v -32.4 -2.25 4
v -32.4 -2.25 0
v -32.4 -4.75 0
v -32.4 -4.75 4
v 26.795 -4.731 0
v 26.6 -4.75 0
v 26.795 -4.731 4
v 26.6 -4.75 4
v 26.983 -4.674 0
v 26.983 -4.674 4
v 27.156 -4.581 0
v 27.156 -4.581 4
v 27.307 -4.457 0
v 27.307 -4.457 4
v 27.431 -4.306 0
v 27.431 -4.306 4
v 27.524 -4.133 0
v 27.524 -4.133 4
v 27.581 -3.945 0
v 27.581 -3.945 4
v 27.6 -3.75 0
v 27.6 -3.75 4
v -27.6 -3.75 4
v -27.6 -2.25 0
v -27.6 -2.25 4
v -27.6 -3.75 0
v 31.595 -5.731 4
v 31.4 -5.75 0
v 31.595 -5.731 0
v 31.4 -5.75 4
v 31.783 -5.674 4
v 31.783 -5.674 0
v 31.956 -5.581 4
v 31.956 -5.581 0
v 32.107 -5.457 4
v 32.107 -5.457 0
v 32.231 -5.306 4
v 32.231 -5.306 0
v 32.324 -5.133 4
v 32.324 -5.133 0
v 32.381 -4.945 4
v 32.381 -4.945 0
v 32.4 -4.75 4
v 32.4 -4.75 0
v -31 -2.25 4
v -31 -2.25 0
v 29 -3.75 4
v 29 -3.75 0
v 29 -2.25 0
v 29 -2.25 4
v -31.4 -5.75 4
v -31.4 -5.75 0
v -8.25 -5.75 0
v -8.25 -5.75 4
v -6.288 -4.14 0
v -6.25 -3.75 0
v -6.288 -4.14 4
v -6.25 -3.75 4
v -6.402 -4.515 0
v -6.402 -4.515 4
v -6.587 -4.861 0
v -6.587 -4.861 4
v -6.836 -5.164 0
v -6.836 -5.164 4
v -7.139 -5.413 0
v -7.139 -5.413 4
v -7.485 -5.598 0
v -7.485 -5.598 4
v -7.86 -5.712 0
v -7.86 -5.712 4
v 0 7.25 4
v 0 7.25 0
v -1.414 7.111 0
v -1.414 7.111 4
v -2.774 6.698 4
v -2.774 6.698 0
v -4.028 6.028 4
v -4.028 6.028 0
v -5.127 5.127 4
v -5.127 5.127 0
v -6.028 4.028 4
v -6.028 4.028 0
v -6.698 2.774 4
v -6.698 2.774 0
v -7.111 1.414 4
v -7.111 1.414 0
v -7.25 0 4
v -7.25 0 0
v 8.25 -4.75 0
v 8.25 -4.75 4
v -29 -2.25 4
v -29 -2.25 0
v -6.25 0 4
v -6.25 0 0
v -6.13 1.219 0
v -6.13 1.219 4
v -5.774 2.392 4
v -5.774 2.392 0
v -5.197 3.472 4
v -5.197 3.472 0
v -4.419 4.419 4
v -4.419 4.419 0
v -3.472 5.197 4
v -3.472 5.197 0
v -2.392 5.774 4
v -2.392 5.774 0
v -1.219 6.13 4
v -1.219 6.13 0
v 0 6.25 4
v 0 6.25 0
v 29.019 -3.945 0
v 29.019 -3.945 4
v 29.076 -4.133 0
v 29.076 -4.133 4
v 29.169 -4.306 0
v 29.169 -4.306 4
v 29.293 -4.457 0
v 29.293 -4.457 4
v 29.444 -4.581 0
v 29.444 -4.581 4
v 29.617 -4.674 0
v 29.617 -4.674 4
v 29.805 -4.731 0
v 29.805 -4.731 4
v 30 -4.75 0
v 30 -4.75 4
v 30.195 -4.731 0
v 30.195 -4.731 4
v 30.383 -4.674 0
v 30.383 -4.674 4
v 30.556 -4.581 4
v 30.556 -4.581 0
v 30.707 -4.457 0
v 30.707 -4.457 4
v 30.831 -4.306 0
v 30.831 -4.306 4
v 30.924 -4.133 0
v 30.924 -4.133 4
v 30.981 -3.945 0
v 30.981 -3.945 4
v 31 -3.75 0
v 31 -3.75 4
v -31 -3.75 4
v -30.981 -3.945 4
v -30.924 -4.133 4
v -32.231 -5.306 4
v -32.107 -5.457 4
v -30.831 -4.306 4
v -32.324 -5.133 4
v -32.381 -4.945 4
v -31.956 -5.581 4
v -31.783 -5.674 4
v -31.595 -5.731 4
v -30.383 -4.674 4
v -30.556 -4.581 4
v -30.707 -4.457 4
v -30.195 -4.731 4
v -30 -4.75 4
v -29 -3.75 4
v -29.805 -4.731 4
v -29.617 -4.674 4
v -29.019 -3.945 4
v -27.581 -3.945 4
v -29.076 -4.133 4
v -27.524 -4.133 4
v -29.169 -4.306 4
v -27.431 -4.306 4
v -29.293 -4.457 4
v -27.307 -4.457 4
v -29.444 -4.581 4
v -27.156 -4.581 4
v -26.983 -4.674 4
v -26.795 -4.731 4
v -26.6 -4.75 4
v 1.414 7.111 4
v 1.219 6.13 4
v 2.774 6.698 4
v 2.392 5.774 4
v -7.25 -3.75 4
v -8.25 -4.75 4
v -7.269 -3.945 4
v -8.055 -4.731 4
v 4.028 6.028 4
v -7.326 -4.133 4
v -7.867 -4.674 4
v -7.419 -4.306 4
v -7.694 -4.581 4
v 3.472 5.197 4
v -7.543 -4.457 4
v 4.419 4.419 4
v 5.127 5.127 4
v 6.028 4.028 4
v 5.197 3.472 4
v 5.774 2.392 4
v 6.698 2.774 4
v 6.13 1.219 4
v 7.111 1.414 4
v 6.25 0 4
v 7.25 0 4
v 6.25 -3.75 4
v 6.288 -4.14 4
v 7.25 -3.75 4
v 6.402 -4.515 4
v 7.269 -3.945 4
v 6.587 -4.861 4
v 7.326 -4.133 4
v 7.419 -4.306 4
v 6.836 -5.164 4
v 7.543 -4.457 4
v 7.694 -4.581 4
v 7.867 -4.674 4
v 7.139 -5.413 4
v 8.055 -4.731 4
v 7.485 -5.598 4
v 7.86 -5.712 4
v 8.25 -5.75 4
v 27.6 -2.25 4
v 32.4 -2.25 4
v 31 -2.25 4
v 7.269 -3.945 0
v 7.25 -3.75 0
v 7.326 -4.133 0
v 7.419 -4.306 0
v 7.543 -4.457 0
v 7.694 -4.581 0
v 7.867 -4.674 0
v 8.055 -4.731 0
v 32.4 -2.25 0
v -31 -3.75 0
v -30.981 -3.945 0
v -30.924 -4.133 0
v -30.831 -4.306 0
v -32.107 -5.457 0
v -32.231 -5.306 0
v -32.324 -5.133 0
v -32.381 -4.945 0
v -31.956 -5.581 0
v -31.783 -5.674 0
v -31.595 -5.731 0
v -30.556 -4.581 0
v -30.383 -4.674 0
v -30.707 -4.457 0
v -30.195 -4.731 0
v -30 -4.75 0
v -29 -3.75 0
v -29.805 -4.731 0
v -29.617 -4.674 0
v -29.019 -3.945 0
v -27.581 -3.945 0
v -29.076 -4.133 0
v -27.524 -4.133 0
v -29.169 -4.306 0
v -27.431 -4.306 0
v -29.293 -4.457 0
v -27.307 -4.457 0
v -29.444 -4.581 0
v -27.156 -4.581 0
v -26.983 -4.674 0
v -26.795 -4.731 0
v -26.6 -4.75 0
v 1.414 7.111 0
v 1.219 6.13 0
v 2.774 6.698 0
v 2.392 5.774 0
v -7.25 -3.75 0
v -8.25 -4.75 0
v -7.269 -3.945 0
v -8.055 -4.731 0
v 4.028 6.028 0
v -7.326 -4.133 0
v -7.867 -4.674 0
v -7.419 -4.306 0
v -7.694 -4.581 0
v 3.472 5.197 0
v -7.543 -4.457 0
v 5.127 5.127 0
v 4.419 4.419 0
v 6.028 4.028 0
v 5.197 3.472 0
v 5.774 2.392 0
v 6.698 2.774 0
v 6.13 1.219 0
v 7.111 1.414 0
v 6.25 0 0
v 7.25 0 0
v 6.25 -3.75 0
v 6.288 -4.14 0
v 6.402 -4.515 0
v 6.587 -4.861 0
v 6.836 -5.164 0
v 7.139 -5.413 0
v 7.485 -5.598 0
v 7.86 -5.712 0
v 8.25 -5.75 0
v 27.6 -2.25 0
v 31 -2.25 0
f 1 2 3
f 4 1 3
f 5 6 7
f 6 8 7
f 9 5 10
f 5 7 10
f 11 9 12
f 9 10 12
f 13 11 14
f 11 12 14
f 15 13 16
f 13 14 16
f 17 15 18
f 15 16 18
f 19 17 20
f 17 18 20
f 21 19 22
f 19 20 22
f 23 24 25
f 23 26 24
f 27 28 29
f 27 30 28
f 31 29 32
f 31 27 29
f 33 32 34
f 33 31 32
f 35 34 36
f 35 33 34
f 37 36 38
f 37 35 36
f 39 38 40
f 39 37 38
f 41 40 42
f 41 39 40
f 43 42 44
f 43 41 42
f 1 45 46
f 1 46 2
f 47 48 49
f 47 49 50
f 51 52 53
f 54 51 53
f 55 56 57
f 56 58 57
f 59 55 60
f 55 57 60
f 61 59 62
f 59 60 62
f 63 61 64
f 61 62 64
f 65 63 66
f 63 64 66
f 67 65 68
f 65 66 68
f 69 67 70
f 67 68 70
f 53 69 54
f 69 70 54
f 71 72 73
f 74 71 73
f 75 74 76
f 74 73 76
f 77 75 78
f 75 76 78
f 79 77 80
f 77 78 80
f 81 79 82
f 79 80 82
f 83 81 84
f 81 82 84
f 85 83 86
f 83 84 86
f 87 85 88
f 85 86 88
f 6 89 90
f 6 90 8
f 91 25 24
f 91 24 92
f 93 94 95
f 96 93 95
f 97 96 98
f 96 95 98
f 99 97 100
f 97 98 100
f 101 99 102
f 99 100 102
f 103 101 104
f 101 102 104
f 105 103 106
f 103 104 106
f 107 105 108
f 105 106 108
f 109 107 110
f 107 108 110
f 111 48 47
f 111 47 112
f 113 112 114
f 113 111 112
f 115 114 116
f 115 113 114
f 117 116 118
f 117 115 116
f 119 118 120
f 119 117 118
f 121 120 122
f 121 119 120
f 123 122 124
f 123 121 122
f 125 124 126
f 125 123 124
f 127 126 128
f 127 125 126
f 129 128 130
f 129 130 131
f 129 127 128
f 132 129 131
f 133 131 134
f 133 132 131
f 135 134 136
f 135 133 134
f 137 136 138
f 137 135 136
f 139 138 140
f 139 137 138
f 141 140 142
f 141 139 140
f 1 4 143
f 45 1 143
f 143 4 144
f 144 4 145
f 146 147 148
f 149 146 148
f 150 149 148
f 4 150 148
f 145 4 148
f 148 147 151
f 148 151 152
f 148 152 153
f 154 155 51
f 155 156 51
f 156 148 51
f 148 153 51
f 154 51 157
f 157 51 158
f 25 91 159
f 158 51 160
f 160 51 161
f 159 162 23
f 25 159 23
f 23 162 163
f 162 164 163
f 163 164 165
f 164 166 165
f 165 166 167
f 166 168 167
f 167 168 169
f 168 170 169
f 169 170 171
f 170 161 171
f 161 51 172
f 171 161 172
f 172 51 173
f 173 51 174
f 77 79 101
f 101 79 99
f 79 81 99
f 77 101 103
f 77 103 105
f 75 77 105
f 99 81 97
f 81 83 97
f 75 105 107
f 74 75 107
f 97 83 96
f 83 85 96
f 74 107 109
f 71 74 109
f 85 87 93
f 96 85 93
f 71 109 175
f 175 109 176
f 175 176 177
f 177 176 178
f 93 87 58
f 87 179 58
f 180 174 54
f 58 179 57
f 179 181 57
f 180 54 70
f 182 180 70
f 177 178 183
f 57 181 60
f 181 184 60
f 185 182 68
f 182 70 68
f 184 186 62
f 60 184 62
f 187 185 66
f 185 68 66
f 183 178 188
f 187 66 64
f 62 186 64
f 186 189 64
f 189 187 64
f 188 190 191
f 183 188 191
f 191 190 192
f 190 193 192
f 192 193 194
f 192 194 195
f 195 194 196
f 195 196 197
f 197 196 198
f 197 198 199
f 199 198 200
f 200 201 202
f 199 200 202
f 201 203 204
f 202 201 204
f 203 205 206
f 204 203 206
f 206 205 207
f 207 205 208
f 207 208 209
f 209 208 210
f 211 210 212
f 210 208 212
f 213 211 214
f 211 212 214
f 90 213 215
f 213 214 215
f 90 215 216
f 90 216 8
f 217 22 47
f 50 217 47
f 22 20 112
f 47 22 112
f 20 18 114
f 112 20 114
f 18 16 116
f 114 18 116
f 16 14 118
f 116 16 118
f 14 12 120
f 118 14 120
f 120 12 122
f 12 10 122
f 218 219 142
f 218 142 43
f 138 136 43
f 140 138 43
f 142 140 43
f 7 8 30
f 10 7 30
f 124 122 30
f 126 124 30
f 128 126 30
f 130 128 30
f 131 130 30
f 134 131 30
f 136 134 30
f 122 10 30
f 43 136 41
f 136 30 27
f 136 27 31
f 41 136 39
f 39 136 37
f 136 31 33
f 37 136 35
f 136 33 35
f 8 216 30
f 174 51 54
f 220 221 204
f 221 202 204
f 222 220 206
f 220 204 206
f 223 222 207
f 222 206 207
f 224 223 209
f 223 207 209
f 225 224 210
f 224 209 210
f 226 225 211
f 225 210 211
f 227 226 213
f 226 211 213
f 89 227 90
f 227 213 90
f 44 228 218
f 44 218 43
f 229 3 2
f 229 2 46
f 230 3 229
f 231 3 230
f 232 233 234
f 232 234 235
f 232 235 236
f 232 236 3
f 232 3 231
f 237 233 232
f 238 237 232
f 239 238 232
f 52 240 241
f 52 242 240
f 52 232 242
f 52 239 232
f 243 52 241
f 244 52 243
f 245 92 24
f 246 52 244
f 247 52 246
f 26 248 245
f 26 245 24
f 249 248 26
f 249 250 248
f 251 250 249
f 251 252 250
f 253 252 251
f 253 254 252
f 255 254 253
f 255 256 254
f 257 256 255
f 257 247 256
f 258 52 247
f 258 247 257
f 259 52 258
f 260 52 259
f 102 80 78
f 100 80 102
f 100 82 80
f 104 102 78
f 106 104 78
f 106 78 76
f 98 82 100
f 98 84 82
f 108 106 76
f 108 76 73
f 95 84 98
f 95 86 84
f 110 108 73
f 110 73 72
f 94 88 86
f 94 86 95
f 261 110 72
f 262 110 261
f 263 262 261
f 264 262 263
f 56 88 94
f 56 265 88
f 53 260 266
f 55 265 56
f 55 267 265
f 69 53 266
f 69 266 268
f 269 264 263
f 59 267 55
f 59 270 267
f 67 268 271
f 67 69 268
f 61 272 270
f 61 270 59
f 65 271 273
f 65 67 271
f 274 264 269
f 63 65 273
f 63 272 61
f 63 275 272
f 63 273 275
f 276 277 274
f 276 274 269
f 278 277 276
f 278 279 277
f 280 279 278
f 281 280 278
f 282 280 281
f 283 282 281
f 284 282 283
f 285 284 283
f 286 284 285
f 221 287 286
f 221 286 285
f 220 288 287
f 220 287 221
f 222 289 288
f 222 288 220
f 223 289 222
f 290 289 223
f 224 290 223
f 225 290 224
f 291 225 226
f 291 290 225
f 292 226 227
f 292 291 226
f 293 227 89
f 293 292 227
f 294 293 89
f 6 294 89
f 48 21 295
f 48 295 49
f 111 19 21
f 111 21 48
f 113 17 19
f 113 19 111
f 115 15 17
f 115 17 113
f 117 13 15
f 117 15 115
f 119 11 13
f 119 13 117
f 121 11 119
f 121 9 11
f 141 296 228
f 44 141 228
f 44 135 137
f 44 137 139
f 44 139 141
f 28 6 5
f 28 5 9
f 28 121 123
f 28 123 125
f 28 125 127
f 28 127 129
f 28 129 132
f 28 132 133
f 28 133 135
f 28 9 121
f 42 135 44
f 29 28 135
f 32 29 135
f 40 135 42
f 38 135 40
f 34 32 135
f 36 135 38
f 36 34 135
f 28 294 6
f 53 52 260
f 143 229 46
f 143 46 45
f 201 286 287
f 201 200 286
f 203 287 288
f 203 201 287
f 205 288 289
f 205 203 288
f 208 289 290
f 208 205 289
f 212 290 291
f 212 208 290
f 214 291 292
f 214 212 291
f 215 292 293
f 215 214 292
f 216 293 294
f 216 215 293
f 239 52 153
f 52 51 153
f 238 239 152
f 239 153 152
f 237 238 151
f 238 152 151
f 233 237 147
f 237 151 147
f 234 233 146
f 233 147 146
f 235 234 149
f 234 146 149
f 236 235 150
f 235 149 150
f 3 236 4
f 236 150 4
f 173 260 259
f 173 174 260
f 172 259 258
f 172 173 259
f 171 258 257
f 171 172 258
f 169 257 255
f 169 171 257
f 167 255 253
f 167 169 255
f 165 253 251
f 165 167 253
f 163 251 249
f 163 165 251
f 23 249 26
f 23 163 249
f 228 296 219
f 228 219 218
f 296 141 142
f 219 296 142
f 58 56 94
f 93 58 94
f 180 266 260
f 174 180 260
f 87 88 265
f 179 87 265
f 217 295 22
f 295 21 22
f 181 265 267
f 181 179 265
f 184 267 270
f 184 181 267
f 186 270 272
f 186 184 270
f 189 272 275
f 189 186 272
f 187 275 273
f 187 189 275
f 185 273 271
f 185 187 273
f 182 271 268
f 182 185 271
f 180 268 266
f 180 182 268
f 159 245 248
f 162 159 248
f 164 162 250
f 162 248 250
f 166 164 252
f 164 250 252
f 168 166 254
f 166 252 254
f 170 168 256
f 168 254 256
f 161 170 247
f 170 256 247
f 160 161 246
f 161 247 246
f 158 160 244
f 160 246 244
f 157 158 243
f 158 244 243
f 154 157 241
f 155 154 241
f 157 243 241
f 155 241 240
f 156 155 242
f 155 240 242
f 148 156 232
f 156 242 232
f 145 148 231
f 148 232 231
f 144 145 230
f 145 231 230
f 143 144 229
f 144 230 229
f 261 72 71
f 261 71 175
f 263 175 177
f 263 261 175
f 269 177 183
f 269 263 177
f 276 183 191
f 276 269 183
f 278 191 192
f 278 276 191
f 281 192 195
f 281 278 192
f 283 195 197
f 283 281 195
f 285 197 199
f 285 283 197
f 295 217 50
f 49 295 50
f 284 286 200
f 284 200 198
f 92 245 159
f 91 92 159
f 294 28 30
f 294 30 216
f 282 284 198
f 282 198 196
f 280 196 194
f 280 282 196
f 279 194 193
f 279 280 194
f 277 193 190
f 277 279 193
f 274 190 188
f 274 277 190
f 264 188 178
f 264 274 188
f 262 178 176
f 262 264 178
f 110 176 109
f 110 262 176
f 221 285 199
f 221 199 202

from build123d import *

# Parameters (mm, degrees)
F1_DEPTH = 4
F2_R     = 0.99999
F3_R     = 2
F4_W     = 1.4
F4_H     = 4
F5_DEPTH = 1.5
F6_R     = 1


# Not quite as in the source:
# - a fillet or chamfer is up to 0.001 mm smaller than in the source, because OpenCascade refuses the exact size


with BuildPart() as f1:
    # F0 (on Top) → F1 (new body)
    with BuildSketch(Plane.XY):
        with BuildLine():
            Line((-6.25, -5.75), (-6.25, -3.6742346142))
            ThreePointArc((-6.25, -3.6742346142), (-6.9955342898, -1.9039432765), (-7.25, 0))
            Line((-7.25, 0), (-7.25, -4.75))
            Line((-7.25, -4.75), (-27.6, -4.75))
            Line((-27.6, -4.75), (-27.6, -3.75))
            Line((-27.6, -3.75), (-29, -3.75))
            ThreePointArc((-29, -3.75), (-30, -4.75), (-31, -3.75))
            Line((-31, -3.75), (-32.4, -3.75))
            ThreePointArc((-32.4, -3.75), (-31.6928932188, -4.0428932188), (-31.4, -4.75))
            ThreePointArc((-31.4, -4.75), (-31.6928932188, -5.4571067812), (-32.4, -5.75))
            Line((-32.4, -5.75), (-6.25, -5.75))
        make_face()
        with BuildLine():
            Line((-32.4, -3.75), (-32.4, -5.75))
            ThreePointArc((-32.4, -5.75), (-31.6928932188, -5.4571067812), (-31.4, -4.75))
            ThreePointArc((-31.4, -4.75), (-31.6928932188, -4.0428932188), (-32.4, -3.75))
        make_face()
        with BuildLine():
            ThreePointArc((-6.25, 0), (-4.4194173824, 4.4194173824), (0, 6.25))
            Line((0, 6.25), (0, 7.25))
            ThreePointArc((0, 7.25), (-5.1265241636, 5.1265241636), (-7.25, 0))
            ThreePointArc((-7.25, 0), (-6.9955342898, -1.9039432765), (-6.25, -3.6742346142))
            Line((-6.25, -3.6742346142), (-6.25, 0))
        make_face()
    extrude(amount=F1_DEPTH)

    # F2 (radius 1 in the source; OpenCascade refuses exactly that, so slightly less here)
    f2_edges = [f1.edges().sort_by_distance(p)[0] for p in [
        (-27.6, -4.75, 2),
        (-7.25, -4.75, 2),
    ]]
    fillet(f2_edges, radius=F2_R)

    # F3
    f3_edges = [f1.edges().sort_by_distance(p)[0] for p in [
        (-6.25, -5.75, 2),
    ]]
    fillet(f3_edges, radius=F3_R)

    # F4 (on face) → F5 (join)
    with BuildSketch(Plane(origin=(0, -3.75, 0), x_dir=(-1, 0, 0), z_dir=(0, 1, 0))):
        with Locations((28.3, 2)):
            Rectangle(F4_W, F4_H)
        with Locations((31.7, 2)):
            Rectangle(F4_W, F4_H)
    extrude(amount=F5_DEPTH)

    # F6
    f6_edges = [f1.edges().sort_by_distance(p)[0] for p in [
        (-32.4, -5.75, 2),
    ]]
    fillet(f6_edges, radius=F6_R)

    # F7: F1 across plane


with BuildPart() as f1_1:
    add(f1.part)
    add(f1.part.mirror(Plane.YZ))


solid = f1_1.part
